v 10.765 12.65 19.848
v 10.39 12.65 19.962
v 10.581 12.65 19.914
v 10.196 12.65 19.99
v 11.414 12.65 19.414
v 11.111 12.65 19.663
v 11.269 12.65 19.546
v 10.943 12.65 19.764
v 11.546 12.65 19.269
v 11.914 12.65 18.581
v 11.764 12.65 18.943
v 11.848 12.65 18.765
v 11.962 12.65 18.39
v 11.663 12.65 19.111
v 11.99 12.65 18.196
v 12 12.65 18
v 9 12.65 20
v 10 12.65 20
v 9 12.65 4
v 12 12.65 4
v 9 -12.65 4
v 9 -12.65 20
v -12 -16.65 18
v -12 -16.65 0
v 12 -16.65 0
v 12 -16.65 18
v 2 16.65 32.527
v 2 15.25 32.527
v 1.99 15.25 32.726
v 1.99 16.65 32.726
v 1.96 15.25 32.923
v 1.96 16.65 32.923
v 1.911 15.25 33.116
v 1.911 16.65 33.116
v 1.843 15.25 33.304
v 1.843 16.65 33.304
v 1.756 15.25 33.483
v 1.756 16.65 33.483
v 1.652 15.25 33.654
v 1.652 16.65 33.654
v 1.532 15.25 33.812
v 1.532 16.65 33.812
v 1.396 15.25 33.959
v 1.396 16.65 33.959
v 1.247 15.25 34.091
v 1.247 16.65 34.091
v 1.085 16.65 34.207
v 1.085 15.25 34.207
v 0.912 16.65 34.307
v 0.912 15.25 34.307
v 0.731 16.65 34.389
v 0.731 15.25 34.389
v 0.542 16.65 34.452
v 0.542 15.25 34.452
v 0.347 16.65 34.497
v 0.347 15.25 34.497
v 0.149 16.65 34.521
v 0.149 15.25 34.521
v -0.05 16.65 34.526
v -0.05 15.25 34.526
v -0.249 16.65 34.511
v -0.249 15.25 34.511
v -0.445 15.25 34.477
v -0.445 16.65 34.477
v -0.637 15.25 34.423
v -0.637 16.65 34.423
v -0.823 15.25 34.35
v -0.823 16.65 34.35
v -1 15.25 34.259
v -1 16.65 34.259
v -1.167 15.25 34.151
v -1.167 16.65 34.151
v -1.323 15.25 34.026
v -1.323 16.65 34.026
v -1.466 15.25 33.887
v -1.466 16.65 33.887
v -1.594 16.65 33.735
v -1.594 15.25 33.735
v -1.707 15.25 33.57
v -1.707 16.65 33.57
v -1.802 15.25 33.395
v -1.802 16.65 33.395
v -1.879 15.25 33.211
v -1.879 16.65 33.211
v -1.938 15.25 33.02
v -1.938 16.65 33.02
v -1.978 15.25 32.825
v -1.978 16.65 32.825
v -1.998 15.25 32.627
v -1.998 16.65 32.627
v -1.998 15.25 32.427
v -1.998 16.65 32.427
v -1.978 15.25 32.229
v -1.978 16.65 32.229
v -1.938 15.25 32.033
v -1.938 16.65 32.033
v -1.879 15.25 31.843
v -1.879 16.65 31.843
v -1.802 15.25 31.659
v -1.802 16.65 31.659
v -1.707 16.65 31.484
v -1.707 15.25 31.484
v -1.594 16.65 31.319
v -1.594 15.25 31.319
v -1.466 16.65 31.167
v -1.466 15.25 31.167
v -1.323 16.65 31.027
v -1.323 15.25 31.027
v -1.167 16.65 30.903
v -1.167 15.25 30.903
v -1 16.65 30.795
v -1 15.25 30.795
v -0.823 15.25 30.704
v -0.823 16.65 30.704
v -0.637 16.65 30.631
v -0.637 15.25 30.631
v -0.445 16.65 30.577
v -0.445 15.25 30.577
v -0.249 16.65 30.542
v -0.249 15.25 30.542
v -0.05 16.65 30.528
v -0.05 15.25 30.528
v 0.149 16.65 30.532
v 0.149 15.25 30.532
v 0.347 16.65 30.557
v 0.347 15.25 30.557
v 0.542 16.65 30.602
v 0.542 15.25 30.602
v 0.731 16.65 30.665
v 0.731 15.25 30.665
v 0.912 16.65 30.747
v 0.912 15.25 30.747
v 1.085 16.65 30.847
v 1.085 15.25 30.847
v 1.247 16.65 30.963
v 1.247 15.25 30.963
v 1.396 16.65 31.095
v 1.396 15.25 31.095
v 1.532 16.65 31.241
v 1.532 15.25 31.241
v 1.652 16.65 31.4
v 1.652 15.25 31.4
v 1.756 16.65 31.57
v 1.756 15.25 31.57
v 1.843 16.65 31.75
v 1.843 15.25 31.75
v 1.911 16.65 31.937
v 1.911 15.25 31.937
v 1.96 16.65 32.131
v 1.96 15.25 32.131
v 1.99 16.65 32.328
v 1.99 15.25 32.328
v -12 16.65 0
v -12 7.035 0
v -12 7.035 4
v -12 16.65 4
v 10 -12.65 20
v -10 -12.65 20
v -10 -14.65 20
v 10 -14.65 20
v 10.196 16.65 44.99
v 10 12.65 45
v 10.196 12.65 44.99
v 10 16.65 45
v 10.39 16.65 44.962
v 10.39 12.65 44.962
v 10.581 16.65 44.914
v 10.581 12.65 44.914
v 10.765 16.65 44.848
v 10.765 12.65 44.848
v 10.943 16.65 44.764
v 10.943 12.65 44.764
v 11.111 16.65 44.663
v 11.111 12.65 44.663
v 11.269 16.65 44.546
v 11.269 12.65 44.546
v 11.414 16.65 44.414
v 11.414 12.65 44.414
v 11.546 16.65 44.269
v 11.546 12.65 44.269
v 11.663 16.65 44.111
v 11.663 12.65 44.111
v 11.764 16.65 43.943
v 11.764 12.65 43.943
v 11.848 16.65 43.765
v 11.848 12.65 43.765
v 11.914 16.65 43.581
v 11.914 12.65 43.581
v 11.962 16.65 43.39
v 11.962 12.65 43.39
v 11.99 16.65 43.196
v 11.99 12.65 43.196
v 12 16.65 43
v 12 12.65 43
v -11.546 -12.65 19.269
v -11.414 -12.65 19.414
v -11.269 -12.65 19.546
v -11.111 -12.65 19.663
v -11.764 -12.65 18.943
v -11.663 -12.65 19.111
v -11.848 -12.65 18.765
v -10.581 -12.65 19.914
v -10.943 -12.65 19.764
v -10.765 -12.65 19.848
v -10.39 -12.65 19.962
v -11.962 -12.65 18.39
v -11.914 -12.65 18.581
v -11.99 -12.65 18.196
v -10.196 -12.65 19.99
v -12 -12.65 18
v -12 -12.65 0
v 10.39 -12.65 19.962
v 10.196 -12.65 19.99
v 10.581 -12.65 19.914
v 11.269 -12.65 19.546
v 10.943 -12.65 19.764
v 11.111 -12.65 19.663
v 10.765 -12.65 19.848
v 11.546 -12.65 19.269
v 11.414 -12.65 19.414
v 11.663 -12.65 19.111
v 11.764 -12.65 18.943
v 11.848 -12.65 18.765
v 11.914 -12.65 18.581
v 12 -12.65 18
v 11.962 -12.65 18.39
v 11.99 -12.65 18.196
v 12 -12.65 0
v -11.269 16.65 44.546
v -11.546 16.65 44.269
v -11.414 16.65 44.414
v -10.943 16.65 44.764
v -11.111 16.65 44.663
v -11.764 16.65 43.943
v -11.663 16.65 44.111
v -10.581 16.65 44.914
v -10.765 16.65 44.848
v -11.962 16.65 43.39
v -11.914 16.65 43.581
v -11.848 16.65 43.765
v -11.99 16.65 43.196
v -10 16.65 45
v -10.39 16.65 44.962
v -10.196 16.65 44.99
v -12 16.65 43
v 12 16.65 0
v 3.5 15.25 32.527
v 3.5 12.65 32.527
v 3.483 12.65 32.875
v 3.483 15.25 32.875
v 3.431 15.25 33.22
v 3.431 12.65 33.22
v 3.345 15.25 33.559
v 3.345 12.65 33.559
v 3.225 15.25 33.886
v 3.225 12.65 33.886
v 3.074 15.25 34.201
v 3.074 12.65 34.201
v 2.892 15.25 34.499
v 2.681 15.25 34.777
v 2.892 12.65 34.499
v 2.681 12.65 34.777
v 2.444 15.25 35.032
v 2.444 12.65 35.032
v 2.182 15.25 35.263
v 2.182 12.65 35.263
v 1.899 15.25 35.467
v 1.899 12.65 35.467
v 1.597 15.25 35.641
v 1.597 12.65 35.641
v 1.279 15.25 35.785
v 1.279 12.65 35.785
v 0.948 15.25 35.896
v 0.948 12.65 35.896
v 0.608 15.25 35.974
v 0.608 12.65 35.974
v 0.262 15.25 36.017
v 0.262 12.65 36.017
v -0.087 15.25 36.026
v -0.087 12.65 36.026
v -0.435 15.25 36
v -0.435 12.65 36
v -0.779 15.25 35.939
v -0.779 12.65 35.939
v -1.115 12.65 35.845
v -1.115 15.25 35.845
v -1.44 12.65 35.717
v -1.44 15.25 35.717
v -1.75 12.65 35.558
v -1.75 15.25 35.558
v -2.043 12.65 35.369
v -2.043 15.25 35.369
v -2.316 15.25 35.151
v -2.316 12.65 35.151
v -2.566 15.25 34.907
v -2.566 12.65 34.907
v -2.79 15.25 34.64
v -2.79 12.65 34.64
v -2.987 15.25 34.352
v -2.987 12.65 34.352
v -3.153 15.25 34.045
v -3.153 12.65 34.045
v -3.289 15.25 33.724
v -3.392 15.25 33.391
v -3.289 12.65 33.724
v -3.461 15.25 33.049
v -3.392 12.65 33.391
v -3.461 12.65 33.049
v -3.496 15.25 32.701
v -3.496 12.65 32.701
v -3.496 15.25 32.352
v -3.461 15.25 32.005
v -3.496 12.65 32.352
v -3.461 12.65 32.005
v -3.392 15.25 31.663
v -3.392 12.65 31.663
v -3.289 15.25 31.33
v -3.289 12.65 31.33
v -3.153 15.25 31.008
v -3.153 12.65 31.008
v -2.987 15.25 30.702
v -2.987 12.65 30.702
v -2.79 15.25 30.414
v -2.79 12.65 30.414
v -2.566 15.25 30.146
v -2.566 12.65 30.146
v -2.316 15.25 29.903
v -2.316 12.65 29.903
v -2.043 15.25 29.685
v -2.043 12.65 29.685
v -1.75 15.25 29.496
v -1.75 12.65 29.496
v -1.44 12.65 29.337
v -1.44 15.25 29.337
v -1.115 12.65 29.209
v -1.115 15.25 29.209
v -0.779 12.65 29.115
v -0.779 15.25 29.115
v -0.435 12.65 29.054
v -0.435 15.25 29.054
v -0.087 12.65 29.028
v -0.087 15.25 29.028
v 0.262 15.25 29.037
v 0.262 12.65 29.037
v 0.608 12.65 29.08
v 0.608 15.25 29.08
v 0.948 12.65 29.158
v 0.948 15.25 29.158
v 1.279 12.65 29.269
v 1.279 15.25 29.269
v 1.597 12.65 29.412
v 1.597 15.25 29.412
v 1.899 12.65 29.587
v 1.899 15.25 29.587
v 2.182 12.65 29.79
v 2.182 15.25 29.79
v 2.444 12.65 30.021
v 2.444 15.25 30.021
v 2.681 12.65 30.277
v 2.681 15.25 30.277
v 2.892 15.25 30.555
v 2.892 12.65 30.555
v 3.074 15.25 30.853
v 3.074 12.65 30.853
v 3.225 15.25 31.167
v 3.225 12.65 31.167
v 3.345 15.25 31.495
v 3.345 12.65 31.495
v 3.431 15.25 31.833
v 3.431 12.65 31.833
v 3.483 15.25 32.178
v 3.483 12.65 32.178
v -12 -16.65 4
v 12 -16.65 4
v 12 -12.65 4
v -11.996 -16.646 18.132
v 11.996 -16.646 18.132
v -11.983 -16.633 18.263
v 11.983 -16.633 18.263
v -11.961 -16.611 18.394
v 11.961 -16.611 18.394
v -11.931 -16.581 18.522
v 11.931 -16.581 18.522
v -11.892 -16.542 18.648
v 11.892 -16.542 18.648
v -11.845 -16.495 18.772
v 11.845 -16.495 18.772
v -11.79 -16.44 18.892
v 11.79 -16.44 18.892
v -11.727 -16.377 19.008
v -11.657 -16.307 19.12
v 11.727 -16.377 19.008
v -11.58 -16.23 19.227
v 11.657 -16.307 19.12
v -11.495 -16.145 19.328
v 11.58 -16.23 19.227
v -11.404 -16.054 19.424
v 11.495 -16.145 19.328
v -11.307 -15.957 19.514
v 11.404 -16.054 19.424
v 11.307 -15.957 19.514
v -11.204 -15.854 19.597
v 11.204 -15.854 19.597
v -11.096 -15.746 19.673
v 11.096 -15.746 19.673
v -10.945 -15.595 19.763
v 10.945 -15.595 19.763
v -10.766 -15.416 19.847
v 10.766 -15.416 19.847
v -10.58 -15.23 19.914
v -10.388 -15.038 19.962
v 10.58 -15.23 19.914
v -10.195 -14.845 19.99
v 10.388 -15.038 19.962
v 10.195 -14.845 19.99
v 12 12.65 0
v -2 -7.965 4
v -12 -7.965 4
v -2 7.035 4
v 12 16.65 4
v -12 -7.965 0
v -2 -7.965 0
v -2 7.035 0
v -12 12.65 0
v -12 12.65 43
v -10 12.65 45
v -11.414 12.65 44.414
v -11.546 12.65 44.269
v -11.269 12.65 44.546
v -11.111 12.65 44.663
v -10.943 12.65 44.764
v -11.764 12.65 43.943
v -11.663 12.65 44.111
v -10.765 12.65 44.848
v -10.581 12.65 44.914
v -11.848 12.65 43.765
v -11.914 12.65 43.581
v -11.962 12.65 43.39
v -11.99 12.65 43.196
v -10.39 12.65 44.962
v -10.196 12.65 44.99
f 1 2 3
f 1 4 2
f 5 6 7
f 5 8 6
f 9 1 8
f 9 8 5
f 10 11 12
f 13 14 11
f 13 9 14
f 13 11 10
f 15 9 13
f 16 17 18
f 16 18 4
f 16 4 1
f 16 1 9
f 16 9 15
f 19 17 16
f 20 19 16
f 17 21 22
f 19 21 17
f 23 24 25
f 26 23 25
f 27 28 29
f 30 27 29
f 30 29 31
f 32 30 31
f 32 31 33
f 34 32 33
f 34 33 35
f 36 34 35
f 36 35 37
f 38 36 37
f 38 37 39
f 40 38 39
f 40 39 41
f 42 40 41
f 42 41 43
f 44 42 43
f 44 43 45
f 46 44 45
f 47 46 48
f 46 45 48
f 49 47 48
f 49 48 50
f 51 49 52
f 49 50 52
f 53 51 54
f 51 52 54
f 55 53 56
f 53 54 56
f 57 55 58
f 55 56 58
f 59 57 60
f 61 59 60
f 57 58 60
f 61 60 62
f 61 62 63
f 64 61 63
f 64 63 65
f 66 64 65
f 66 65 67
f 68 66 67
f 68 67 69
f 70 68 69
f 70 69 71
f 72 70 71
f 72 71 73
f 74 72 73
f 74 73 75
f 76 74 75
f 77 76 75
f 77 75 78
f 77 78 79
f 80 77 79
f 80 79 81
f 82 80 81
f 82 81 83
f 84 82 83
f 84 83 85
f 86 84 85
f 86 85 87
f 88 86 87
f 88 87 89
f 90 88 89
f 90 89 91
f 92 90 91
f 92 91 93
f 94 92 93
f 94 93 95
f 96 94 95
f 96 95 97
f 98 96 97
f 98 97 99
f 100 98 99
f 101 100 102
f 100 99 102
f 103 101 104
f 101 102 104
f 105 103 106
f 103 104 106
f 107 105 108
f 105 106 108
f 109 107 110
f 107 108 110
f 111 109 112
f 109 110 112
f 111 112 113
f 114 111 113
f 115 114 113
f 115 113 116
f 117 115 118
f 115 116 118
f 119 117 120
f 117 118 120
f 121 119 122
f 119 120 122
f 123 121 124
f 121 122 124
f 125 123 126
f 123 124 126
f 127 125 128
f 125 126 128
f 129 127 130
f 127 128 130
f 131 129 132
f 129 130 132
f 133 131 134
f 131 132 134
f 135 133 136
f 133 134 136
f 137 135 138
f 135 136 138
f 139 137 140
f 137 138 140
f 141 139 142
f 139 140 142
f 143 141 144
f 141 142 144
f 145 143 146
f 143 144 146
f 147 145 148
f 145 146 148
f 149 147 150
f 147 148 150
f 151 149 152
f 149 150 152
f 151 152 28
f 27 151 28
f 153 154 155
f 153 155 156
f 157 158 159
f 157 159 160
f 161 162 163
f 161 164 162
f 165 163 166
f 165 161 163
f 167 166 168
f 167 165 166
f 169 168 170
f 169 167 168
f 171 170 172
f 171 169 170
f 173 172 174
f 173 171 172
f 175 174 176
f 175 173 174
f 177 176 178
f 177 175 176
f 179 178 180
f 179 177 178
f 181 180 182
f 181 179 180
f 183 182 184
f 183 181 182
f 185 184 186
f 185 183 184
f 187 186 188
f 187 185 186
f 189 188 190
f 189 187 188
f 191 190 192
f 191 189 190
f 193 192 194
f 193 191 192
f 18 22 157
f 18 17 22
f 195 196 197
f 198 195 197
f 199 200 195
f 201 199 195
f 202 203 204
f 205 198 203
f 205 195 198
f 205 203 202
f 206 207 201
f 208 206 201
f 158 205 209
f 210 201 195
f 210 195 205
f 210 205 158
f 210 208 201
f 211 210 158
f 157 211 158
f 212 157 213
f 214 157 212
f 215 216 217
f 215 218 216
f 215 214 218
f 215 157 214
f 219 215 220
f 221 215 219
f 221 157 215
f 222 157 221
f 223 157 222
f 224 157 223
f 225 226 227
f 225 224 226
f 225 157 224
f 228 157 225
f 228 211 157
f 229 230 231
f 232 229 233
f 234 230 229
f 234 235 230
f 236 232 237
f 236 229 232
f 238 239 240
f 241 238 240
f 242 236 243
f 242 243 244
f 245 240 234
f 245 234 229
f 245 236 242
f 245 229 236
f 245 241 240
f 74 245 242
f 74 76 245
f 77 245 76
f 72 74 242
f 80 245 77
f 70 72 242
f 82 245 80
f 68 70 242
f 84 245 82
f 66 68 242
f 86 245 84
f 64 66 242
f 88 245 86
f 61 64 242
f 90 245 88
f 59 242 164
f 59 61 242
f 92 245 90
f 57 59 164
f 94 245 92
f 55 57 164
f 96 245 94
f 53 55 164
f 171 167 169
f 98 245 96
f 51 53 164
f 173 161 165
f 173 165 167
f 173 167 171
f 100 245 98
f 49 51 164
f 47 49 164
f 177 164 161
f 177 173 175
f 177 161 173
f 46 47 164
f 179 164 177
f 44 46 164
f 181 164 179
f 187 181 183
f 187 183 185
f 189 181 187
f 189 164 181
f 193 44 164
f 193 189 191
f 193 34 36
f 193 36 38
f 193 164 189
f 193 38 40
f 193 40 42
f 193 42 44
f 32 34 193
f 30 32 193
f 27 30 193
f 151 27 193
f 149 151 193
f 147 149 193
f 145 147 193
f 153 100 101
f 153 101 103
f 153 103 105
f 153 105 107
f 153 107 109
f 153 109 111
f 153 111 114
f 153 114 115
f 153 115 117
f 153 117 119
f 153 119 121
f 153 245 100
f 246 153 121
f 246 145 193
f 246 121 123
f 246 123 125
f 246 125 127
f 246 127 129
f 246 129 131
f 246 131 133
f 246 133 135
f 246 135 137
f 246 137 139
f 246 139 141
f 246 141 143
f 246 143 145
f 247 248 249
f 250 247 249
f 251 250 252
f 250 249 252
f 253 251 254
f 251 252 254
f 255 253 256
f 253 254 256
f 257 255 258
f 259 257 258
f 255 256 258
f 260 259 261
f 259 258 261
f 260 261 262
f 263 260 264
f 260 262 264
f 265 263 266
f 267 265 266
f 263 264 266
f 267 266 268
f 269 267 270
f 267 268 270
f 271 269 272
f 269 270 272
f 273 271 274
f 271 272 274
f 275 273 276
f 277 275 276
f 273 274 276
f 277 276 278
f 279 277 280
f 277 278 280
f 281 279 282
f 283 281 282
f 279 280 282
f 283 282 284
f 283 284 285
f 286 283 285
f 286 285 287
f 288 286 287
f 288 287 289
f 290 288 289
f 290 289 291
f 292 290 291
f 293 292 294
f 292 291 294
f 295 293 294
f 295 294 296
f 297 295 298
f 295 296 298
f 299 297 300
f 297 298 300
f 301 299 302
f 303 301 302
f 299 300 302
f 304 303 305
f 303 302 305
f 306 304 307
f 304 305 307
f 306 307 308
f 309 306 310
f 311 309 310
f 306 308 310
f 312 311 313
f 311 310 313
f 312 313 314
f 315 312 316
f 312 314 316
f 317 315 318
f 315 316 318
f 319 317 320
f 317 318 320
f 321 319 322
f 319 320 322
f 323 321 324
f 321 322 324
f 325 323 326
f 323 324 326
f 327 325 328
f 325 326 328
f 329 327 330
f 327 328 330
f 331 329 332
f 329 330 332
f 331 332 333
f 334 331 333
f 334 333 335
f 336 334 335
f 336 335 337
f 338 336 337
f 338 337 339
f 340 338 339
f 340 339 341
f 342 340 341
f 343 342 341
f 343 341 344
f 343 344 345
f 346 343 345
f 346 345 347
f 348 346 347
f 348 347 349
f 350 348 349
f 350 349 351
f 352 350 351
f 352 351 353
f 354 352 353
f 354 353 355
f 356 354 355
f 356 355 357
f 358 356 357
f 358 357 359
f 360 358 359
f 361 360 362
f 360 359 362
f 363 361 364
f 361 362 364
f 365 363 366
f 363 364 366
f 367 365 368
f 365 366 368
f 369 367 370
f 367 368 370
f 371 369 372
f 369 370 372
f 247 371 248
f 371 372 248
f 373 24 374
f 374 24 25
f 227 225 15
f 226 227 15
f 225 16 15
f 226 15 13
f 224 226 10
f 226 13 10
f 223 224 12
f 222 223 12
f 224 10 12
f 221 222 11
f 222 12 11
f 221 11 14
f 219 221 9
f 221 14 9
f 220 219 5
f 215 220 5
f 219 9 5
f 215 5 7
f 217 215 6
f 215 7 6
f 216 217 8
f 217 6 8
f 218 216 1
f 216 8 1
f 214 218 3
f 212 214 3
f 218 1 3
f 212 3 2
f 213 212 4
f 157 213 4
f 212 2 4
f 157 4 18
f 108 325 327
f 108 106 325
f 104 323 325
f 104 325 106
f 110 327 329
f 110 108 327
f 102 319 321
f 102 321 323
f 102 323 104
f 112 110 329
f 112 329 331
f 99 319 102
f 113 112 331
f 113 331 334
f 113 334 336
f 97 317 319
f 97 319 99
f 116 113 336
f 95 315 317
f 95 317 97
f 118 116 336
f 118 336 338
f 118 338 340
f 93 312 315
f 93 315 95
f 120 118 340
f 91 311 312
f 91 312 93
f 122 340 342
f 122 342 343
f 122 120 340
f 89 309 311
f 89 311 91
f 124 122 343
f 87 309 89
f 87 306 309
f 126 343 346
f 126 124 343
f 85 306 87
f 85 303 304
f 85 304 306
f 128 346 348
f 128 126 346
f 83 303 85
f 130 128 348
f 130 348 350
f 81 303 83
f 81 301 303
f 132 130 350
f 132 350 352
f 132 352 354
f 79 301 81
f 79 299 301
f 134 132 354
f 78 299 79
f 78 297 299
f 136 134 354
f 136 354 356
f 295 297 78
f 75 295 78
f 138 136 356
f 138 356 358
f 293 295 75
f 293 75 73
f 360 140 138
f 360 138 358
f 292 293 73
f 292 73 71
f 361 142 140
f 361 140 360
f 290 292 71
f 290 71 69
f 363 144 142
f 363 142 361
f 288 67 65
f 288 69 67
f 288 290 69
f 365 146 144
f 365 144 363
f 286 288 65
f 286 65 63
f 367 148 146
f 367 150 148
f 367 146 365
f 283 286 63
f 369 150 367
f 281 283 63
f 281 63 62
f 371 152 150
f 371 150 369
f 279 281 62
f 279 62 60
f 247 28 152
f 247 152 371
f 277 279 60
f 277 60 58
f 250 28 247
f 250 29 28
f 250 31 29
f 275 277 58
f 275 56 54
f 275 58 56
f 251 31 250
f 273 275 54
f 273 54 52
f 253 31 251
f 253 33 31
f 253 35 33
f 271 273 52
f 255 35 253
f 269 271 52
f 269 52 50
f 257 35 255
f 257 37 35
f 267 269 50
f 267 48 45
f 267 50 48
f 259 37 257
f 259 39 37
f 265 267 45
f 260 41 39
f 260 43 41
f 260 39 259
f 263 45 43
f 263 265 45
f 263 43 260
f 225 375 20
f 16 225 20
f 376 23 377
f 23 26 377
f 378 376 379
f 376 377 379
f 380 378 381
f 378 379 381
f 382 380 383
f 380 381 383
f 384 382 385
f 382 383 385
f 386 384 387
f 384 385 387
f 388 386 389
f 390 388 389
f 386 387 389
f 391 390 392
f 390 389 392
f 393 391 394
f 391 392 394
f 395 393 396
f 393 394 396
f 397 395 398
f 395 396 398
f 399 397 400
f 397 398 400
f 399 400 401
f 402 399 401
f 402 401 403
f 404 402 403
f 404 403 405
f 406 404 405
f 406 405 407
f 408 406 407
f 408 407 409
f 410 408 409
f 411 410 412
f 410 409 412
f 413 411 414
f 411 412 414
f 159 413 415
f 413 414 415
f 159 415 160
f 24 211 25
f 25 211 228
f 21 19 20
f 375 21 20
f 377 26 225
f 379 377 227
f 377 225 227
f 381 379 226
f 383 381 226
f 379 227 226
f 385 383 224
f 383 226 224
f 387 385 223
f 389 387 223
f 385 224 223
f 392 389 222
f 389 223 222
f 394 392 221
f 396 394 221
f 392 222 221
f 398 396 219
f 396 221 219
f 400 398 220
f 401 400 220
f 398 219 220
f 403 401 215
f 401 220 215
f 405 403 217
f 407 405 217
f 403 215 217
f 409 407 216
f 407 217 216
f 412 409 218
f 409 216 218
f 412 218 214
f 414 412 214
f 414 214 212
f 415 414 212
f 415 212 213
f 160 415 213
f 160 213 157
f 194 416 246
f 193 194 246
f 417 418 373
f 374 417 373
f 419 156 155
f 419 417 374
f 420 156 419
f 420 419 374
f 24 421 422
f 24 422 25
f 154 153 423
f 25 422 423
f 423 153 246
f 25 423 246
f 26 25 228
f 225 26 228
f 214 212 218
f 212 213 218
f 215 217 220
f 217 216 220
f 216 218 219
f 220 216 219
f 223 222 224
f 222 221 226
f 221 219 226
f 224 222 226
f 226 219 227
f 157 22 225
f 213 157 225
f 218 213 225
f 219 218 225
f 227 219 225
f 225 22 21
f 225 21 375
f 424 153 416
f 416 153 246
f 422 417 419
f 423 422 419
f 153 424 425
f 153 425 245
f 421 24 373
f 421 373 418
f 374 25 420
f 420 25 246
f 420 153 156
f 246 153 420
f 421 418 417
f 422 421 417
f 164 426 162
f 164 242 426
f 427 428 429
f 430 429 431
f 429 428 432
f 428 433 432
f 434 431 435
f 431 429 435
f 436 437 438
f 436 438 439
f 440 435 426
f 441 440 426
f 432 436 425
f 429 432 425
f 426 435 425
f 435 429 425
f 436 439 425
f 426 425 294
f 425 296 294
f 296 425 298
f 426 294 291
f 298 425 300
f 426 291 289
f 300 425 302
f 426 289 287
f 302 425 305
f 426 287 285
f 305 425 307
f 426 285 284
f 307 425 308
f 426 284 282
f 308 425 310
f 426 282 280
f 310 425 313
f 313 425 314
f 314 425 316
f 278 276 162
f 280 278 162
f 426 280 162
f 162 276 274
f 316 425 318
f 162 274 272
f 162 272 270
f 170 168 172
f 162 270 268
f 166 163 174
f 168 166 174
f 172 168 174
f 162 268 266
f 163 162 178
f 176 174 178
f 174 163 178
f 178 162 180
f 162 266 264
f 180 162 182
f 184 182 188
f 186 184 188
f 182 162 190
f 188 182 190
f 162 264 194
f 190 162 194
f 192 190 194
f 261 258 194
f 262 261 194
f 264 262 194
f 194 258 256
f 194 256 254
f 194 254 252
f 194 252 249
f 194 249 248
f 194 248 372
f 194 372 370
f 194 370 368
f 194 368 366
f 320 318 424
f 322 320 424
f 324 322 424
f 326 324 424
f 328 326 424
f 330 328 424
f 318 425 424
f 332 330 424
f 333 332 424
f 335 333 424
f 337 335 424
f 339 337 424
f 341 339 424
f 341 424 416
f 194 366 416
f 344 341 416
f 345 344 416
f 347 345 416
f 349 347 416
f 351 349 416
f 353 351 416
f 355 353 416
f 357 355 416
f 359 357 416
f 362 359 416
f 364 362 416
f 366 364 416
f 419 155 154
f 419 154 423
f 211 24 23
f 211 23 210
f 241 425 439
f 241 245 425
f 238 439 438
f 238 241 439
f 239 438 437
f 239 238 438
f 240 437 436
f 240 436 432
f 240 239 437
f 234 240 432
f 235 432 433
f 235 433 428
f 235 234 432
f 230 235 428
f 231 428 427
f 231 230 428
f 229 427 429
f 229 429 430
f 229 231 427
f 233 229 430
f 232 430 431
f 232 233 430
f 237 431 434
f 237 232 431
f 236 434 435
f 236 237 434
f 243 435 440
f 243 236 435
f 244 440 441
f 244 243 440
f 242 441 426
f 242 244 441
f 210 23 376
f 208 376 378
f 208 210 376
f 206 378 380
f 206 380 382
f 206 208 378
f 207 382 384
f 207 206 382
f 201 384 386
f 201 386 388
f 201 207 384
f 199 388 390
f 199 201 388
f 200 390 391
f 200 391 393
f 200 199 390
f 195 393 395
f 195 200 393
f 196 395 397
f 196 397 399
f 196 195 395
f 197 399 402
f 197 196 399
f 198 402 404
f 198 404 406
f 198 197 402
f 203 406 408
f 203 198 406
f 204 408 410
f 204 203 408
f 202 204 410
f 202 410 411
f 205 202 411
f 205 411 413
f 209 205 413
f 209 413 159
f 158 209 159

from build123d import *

# Parameters (mm, degrees)
F0_W      = 24
F0_H      = 33.3
F1_DEPTH  = 4
F2_W      = 24
F2_H      = 4
F3_DEPTH  = 45
F4_W      = 24
F4_H      = 4
F5_DEPTH  = 20
F6_R      = 2
F7_DEPTH  = 6
F8_R      = 3.5
F9_DEPTH  = 2.6
F10_R     = 2
F12_W     = 3
F12_H     = 25.3
F13_DEPTH = 16
F14_R     = 2
F14_2_R   = 2
F11_W     = 15
F11_H     = 15
F15_DEPTH = 6


with BuildPart() as f1:
    # F0 (on Top) → F1 (new body)
    with BuildSketch(Plane.XY):
        Rectangle(F0_W, F0_H)
    extrude(amount=F1_DEPTH)

    # F11 (on face) → F15 (cut)
    with BuildSketch(Plane.XY.offset(4)):
        with Locations((-9.5, -0.465378)):
            Rectangle(F11_W, F11_H)
    extrude(amount=-F15_DEPTH, mode=Mode.SUBTRACT)


with BuildPart() as f3:
    # F2 (on face) → F3 (new body)
    with BuildSketch(Plane.XY):
        with Locations((0, 14.65)):
            Rectangle(F2_W, F2_H)
    extrude(amount=F3_DEPTH)

    # F6 (on face) → F7 (cut)
    with BuildSketch(Plane.XZ.offset(-12.65)):
        with Locations((0, 32.526892)):
            Circle(F6_R)
    extrude(amount=-F7_DEPTH, mode=Mode.SUBTRACT)

    # F8 (on face) → F9 (cut)
    with BuildSketch(Plane.XZ.offset(-12.65)):
        with Locations((0, 32.526892)):
            Circle(F8_R)
    extrude(amount=-F9_DEPTH, mode=Mode.SUBTRACT)

    # F10
    f10_edges = [f3.edges().sort_by_distance(p)[0] for p in [
        (-12, 14.65, 45),
        (12, 14.65, 45),
    ]]
    fillet(f10_edges, radius=F10_R)


with BuildPart() as f5:
    # F4 (on face) → F5 (new body)
    with BuildSketch(Plane.XY):
        with Locations((0, -14.65)):
            Rectangle(F4_W, F4_H)
    extrude(amount=F5_DEPTH)

    # F14
    f14_edges = [f5.edges().sort_by_distance(p)[0] for p in [
        (0, -16.65, 20),
        (-12, -14.65, 20),
        (12, -14.65, 20),
    ]]
    fillet(f14_edges, radius=F14_R)


with BuildPart() as f13:
    # F12 (on face) → F13 (new body)
    with BuildSketch(Plane.XY.offset(4)):
        with Locations((10.5, 0)):
            Rectangle(F12_W, F12_H)
    extrude(amount=F13_DEPTH)

    # F14#2
    f14_2_edges = [f13.edges().sort_by_distance(p)[0] for p in [
        (12, 0, 20),
    ]]
    fillet(f14_2_edges, radius=F14_2_R)


solid = Compound([f1.part, f3.part, f5.part, f13.part])
